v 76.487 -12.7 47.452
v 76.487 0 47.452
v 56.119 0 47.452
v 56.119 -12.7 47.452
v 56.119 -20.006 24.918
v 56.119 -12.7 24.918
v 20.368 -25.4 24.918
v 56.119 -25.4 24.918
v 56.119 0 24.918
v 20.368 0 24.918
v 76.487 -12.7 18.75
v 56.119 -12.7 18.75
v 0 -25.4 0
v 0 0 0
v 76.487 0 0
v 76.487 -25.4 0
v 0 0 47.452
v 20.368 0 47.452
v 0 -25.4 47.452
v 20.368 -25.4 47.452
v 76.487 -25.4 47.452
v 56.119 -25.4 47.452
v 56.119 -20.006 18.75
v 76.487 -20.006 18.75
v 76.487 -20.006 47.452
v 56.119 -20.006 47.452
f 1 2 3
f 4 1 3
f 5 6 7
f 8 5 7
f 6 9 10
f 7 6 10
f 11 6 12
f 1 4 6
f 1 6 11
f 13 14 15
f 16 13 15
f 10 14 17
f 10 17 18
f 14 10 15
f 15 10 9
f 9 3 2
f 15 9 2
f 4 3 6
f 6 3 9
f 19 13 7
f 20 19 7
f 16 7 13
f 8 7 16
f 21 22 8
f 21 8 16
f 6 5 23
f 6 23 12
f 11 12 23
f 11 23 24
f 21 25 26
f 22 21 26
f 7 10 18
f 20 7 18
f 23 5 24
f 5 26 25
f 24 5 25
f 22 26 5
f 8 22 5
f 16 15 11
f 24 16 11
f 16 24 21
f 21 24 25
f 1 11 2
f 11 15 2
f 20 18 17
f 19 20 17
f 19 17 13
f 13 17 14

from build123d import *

# Parameters (mm, degrees)
F1_DEPTH = 25.4
F2_W     = 20.367536
F2_H     = 9.66201
F3_DEPTH = 25.4
F4_W     = 8.65579
F4_H     = 21.259759
F5_DEPTH = 25.146
F6_W     = 20.367536
F6_H     = 7.306238
F7_DEPTH = 28.702


with BuildPart() as f1:
    # F0 (on Front) → F1 (new body)
    with BuildSketch(Plane.XZ):
        Polygon((20.367537, 47.451993), (0, 47.451993), (0, 0), (76.48655, 0), (76.48655, 47.451993), (56.119014, 47.451993), (56.119014, 24.917716), (20.367537, 24.917716), align=None)
    extrude(amount=F1_DEPTH)

    # F2 (on face) → F3 (cut)
    with BuildSketch(Plane.XY.offset(47.451993)):
        with Locations((66.302782, -14.511633)):
            Rectangle(F2_W, F2_H)
    extrude(amount=F3_DEPTH, mode=Mode.SUBTRACT)

    # F4 (on face) → F5 (join)
    with BuildSketch(Plane.XY.offset(47.451993)):
        with Locations((66.302782, -14.77012)):
            Rectangle(F4_W, F4_H)
    extrude(amount=-F5_DEPTH)

    # F6 (on face) → F7 (cut)
    with BuildSketch(Plane.XY.offset(47.451993)):
        with Locations((66.302782, -16.353119)):
            Rectangle(F6_W, F6_H)
    extrude(amount=-F7_DEPTH, mode=Mode.SUBTRACT)


solid = f1.part
